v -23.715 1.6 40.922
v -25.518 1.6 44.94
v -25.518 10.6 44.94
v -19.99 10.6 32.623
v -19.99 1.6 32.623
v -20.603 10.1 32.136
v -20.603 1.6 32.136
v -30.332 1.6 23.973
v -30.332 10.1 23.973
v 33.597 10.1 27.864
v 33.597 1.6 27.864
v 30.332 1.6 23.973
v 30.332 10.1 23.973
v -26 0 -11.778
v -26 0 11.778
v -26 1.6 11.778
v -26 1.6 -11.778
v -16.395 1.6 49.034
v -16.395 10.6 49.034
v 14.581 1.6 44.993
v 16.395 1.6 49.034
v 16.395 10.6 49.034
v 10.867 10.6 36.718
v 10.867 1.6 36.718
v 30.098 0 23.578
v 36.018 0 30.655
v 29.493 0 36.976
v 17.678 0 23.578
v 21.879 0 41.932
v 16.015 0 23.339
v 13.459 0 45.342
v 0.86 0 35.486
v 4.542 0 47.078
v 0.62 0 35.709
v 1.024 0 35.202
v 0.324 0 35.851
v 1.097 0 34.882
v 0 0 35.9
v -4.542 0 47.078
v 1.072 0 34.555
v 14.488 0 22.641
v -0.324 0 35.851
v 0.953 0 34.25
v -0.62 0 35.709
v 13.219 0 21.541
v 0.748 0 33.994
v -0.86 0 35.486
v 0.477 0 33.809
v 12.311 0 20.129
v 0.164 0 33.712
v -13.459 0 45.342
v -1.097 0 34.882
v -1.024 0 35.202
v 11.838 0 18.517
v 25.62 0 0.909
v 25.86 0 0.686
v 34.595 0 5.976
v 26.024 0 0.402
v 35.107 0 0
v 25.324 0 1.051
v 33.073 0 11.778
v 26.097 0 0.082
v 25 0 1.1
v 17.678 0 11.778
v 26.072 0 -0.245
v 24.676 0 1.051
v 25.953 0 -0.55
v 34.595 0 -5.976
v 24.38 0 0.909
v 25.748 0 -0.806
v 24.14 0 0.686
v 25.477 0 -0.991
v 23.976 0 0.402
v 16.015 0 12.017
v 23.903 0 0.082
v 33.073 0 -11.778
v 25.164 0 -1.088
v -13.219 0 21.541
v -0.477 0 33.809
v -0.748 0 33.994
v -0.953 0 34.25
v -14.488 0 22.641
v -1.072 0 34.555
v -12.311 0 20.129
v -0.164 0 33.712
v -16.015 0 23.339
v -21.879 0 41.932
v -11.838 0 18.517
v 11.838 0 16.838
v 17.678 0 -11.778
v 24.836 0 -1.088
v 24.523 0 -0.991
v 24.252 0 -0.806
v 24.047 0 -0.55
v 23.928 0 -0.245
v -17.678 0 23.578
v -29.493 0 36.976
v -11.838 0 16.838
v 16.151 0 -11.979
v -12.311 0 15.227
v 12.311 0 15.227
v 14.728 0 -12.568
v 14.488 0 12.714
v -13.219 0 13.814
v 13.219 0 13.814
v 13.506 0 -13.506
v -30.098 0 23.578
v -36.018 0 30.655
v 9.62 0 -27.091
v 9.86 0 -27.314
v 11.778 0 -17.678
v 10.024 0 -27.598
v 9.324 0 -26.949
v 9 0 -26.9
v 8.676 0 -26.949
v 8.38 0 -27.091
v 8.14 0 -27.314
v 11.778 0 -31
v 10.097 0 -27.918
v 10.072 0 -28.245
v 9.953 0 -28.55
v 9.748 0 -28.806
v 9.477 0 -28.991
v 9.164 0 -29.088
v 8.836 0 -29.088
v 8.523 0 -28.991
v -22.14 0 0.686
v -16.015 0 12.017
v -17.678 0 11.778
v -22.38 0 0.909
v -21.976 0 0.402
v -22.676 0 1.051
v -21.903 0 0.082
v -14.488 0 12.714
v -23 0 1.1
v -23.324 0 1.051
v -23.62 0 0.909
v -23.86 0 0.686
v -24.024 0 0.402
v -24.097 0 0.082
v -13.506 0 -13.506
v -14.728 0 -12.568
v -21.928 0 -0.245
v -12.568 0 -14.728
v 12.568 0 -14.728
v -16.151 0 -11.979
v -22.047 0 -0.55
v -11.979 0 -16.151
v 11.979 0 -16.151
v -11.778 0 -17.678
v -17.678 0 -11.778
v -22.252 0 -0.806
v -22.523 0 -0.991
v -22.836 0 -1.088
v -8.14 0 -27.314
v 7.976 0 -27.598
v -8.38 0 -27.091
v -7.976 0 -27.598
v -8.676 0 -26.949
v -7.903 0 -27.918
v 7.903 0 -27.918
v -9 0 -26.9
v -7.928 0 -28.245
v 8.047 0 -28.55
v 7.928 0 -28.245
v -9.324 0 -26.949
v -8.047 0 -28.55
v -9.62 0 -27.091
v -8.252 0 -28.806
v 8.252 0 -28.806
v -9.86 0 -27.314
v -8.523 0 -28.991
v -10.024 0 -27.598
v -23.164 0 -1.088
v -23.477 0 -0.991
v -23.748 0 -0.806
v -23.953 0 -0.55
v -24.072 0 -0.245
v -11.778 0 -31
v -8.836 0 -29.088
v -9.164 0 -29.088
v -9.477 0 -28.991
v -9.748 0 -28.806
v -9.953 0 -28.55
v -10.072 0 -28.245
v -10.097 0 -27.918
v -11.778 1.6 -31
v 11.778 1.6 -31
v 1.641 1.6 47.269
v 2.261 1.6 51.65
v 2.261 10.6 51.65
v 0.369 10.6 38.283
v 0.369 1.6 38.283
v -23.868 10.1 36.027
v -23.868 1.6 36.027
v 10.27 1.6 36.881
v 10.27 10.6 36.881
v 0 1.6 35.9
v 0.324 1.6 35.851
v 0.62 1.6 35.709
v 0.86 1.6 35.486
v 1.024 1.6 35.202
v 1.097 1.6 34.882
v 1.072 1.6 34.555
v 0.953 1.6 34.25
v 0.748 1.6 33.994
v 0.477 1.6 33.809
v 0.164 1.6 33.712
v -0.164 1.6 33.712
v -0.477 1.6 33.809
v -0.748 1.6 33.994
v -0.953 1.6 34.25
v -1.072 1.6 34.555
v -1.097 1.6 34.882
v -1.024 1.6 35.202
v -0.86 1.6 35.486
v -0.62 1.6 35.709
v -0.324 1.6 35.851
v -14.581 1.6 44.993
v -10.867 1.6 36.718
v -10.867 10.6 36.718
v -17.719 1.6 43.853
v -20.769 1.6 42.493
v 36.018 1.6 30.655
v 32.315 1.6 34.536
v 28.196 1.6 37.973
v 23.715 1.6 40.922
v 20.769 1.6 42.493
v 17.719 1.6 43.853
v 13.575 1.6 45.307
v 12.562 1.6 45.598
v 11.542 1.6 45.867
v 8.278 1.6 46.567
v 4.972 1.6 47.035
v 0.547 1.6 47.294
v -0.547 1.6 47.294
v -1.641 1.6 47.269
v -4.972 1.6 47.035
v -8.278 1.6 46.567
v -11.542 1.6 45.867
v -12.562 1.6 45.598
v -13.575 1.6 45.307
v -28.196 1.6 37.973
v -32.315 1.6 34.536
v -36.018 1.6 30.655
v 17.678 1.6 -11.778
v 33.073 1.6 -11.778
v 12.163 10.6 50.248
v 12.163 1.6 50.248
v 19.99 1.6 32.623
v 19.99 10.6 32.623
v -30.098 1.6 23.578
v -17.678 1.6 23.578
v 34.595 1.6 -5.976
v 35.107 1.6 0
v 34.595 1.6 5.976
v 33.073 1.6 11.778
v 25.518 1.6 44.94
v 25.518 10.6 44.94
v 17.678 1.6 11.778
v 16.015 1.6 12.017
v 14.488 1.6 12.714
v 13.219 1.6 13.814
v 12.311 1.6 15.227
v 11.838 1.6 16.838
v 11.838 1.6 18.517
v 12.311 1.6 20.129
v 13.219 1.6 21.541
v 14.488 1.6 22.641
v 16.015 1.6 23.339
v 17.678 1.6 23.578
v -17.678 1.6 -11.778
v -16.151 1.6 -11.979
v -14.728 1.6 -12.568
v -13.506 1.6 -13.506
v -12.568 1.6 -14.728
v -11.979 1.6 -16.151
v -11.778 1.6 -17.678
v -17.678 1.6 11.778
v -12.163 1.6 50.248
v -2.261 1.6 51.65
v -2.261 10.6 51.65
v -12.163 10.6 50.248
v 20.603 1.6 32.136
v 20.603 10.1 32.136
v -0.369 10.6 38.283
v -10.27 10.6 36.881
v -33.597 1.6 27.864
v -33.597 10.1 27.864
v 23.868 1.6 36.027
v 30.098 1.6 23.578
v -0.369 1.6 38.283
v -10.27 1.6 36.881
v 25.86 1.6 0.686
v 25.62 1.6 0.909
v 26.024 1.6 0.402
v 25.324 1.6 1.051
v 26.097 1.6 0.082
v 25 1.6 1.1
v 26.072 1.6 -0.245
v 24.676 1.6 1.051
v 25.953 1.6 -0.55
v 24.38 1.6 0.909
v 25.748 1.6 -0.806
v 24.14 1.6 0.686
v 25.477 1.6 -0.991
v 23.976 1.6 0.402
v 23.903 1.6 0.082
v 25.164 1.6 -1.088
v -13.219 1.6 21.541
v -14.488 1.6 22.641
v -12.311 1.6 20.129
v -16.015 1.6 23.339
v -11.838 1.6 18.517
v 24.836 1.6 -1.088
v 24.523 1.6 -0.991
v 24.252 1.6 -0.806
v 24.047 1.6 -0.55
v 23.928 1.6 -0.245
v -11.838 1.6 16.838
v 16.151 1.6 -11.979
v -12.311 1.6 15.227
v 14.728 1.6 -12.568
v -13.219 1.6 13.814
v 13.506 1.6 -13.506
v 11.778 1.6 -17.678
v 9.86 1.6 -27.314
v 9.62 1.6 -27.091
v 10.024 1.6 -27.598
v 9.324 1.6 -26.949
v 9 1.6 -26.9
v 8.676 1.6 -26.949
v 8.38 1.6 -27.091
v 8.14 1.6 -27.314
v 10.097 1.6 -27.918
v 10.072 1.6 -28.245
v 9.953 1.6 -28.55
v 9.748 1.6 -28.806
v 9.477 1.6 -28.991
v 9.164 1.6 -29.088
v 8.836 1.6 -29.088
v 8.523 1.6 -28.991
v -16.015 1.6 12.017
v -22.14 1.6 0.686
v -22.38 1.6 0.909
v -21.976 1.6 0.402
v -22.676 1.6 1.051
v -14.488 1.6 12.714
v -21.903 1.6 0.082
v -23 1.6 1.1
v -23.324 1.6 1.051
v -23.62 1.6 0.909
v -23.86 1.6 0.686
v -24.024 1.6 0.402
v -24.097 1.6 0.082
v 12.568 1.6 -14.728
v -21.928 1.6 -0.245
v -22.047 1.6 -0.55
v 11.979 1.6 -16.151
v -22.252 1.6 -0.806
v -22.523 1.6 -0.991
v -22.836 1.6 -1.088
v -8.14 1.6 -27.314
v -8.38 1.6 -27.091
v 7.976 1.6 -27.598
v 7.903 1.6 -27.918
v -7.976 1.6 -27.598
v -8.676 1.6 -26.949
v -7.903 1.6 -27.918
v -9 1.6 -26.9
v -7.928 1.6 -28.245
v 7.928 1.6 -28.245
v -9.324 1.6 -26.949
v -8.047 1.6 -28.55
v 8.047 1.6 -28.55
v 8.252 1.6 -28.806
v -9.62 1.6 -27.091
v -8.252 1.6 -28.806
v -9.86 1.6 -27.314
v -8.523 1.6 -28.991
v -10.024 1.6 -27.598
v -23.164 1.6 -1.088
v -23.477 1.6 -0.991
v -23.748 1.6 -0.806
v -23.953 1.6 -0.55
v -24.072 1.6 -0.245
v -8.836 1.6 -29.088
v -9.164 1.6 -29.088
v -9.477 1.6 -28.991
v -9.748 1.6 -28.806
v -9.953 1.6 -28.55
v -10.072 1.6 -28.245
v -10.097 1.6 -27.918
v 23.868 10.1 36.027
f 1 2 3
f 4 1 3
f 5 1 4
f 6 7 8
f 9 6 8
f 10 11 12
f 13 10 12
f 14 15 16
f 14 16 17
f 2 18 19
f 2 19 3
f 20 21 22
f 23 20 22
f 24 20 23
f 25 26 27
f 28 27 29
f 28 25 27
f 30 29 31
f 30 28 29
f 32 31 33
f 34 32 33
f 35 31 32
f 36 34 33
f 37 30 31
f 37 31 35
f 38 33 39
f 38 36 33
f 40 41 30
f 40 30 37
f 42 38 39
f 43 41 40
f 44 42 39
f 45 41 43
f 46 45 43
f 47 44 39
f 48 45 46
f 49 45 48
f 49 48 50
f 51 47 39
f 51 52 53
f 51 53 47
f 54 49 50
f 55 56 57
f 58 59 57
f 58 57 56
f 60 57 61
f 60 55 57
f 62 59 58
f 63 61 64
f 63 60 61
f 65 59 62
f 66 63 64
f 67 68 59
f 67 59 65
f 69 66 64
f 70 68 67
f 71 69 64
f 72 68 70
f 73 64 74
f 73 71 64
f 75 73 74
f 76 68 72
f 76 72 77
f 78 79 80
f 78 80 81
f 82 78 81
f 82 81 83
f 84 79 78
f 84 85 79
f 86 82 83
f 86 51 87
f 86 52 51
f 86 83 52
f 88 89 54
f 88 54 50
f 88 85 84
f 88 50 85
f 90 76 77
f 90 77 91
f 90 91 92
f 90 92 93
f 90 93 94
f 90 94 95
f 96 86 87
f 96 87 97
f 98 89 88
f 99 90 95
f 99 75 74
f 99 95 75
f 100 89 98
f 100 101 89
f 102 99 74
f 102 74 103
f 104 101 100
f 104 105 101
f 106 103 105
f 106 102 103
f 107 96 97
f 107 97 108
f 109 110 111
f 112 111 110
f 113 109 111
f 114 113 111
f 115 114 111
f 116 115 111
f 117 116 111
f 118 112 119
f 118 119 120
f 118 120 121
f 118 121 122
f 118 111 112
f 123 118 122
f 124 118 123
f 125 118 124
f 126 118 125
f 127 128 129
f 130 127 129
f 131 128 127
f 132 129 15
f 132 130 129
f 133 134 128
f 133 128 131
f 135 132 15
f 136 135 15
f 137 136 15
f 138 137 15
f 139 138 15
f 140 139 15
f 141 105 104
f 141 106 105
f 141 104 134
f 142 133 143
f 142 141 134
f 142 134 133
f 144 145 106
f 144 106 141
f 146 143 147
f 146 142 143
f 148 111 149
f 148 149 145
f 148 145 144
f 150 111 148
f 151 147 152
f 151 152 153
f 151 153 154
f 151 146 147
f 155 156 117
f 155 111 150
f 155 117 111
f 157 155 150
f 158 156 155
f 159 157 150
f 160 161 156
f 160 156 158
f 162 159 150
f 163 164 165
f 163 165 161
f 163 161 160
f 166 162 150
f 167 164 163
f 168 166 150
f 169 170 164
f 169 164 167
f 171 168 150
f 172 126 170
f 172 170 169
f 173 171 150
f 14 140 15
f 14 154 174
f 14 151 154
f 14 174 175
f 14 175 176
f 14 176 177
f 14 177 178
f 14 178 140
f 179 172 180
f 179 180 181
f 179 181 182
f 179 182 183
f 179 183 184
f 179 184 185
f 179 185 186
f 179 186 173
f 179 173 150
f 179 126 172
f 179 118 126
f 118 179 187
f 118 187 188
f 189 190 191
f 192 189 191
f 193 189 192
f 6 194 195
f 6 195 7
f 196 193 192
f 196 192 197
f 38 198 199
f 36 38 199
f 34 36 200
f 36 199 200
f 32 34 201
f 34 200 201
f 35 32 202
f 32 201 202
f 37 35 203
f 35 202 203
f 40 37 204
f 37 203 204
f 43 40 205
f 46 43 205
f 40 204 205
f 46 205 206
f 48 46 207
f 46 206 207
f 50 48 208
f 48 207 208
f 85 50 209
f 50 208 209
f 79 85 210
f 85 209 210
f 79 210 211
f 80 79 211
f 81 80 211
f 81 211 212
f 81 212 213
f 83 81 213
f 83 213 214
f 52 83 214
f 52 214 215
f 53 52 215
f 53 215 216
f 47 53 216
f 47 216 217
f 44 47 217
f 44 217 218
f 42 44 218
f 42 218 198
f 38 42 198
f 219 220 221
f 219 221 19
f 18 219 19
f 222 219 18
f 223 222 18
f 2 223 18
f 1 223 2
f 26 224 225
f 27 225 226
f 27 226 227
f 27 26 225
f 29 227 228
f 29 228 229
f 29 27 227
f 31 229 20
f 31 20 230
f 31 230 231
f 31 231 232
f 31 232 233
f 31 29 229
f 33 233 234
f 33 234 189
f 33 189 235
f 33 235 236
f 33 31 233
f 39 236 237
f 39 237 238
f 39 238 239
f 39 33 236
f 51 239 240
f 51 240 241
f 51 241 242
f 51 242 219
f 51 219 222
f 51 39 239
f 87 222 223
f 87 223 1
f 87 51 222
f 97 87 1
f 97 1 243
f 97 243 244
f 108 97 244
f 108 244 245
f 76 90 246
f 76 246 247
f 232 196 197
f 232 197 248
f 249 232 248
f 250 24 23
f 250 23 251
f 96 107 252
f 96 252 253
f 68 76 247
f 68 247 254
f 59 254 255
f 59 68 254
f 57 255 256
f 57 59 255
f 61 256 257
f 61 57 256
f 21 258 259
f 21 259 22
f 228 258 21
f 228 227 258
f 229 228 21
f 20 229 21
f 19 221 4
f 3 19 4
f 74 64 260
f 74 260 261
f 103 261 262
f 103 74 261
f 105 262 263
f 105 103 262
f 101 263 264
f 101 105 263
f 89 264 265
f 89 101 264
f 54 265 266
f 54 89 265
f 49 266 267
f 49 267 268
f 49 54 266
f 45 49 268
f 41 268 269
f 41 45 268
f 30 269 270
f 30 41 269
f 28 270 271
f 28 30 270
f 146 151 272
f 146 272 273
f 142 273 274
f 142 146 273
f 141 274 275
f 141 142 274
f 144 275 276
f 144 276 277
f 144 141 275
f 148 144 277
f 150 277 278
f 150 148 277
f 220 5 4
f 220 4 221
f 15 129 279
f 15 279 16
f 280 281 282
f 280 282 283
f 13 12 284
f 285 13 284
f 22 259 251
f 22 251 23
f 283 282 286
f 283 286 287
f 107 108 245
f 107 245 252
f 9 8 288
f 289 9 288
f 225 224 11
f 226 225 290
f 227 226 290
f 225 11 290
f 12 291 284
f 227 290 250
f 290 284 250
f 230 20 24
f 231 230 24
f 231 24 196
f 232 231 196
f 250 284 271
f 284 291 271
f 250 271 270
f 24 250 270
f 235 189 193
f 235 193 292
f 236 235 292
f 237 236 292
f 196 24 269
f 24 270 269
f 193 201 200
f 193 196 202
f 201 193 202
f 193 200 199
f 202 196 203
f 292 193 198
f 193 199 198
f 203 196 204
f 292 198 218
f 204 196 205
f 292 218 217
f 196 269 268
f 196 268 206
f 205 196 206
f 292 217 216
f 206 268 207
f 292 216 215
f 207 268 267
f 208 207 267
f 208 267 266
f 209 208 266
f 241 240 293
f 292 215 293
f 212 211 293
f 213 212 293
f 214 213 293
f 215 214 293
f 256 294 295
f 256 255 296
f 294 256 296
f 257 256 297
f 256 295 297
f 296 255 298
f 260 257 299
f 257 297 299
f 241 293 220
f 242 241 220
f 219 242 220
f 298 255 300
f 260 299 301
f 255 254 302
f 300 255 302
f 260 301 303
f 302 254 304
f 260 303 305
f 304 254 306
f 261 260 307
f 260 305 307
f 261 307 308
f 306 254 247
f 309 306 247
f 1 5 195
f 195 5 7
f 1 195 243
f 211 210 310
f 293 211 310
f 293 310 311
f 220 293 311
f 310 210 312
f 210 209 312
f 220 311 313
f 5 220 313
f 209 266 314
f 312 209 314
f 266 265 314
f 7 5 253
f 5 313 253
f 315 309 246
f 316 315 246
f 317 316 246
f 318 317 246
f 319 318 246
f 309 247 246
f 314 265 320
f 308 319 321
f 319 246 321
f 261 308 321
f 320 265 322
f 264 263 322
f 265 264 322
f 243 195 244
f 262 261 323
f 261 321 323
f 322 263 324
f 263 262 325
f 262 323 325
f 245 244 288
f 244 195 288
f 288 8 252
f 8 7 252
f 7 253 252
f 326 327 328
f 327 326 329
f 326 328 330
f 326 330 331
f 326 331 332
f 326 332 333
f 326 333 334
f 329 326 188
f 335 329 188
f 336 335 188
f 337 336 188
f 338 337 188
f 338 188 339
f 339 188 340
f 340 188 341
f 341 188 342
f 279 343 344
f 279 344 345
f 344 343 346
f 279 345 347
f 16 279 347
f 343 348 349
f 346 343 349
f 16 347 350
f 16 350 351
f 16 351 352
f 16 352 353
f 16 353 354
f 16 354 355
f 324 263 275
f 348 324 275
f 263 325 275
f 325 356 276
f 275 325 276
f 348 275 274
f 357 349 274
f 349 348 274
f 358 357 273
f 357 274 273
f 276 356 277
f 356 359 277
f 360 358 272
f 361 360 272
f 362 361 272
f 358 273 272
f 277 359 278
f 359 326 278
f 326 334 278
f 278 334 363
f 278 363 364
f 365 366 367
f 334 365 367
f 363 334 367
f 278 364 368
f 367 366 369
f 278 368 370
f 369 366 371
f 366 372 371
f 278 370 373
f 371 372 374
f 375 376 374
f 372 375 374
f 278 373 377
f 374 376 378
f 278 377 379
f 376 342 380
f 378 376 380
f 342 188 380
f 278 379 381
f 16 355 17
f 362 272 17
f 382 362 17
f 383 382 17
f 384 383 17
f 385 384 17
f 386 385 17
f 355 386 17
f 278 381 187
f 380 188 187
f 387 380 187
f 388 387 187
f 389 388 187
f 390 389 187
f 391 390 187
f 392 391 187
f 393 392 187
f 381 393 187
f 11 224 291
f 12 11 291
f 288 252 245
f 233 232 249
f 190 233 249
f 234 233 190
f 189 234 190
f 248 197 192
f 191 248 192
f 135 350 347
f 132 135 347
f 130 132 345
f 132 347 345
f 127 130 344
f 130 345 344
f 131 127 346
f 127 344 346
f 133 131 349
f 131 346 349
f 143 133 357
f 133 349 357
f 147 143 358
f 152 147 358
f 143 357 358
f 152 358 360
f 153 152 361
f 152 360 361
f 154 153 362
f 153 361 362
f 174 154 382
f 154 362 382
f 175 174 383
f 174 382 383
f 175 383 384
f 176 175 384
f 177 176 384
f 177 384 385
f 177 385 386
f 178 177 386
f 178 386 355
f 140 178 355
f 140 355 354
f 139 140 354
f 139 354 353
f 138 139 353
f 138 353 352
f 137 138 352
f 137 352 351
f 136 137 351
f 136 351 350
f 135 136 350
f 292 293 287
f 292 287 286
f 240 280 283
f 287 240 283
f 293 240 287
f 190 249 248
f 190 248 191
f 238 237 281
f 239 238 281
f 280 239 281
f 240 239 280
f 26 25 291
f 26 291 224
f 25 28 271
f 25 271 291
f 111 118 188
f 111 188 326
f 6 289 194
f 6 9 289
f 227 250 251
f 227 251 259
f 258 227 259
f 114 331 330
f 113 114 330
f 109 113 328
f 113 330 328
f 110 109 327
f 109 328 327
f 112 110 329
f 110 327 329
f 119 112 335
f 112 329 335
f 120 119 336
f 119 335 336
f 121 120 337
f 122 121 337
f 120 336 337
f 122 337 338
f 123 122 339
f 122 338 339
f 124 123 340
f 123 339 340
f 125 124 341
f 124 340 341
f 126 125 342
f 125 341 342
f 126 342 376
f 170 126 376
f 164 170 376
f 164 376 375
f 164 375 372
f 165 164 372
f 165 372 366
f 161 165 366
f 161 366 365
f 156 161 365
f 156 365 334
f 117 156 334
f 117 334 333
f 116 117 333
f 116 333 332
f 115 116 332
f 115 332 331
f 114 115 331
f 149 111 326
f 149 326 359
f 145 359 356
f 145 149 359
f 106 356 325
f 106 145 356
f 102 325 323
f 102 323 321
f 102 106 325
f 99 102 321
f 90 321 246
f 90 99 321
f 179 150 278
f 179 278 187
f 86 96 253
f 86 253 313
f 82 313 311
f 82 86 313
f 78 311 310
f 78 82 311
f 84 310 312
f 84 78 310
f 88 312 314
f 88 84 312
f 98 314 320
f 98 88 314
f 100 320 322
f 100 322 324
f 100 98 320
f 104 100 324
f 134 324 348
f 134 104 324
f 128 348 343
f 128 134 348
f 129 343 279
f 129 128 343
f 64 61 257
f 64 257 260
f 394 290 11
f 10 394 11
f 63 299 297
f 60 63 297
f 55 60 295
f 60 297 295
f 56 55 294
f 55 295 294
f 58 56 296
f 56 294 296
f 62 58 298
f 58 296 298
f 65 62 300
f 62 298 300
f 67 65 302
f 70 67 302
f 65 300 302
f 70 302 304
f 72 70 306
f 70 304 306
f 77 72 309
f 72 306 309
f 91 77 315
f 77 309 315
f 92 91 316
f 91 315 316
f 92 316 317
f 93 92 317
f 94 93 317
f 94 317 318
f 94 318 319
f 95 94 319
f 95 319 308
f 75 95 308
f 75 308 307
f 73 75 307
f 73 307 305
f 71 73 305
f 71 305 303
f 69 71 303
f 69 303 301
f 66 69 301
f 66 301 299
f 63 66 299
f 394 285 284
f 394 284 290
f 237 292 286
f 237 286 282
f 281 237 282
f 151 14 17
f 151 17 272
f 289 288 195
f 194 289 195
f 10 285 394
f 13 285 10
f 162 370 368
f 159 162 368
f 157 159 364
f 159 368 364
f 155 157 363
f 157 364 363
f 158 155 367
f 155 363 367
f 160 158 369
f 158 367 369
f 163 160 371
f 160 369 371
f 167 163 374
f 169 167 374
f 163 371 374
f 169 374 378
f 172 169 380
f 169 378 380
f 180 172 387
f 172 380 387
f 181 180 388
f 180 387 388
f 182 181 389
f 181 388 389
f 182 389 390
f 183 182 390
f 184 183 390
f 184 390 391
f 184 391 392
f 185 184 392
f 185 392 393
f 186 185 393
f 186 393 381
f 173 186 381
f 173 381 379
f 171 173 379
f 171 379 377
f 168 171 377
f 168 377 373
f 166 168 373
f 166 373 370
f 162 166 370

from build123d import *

# Parameters (mm, degrees)
BOSS_EXTRUDE1_DEPTH = 1.6
BOSS_EXTRUDE2_DEPTH = 8.5
BOSS_EXTRUDE3_DEPTH = 9
SKETCH4_R           = 1.1
CUT_EXTRUDE1_DEPTH  = 64.607734681


with BuildPart() as part:
    # Sketch1 → Boss-Extrude1 (new body)
    with BuildSketch(Plane(origin=(0, 0, 0), x_dir=(1, 0, 0), z_dir=(0, 1, 0))):
        with BuildLine():
            Line((-11.77766953, 17.67766953), (-11.77766953, 31))
            Line((-11.77766953, 31), (11.77766953, 31))
            Line((11.77766953, 31), (11.77766953, 17.67766953))
            ThreePointArc((11.77766953, 17.67766953), (13.505739521, 13.505739521), (17.67766953, 11.77766953))
            Line((17.67766953, 11.77766953), (33.07278358, 11.77766953))
            ThreePointArc((33.07278358, 11.77766953), (35.1073, 0), (33.07278358, -11.77766953))
            Line((33.07278358, -11.77766953), (17.67766953, -11.77766953))
            ThreePointArc((17.67766953, -11.77766953), (11.77766953, -17.67766953), (17.67766953, -23.57766953))
            Line((17.67766953, -23.57766953), (30.09766953, -23.57766953))
            Line((30.09766953, -23.57766953), (36.017643771, -30.655106364))
            ThreePointArc((36.017643771, -30.655106364), (0, -47.297), (-36.017643771, -30.655106364))
            Line((-36.017643771, -30.655106364), (-30.09766953, -23.57766953))
            Line((-30.09766953, -23.57766953), (-17.67766953, -23.57766953))
            ThreePointArc((-17.67766953, -23.57766953), (-11.77766953, -17.67766953), (-17.67766953, -11.77766953))
            Line((-17.67766953, -11.77766953), (-26, -11.77766953))
            Line((-26, -11.77766953), (-26, 11.77766953))
            Line((-26, 11.77766953), (-17.67766953, 11.77766953))
            ThreePointArc((-17.67766953, 11.77766953), (-13.505739521, 13.505739521), (-11.77766953, 17.67766953))
        make_face()
    extrude(amount=BOSS_EXTRUDE1_DEPTH)

    # Sketch2 → Boss-Extrude2 (add)
    with BuildSketch(Plane(origin=(0, 1.6, 0), x_dir=(1, 0, 0), z_dir=(0, 1, 0))):
        Polygon((-33.597062742, -27.864051564), (-23.868298315, -36.027454207), (-20.602937258, -32.135948436), (-30.331701685, -23.972545793), align=None)
        Polygon((23.868298315, -36.027454207), (33.597062742, -27.864051564), (30.331701685, -23.972545793), (20.602937258, -32.135948436), align=None)
    extrude(amount=BOSS_EXTRUDE2_DEPTH)

    # Sketch3 → Boss-Extrude3 (add)
    with BuildSketch(Plane(origin=(0, 1.6, 0), x_dir=(1, 0, 0), z_dir=(0, 1, 0))):
        Polygon((-25.517948101, -44.939697826), (-19.990220336, -32.623276846), (-10.866945536, -36.717890005), (-16.394673301, -49.034310985), align=None)
        Polygon((-0.36916096, -38.28278004), (-2.261296496, -51.649523215), (-12.162587737, -50.247941336), (-10.2704522, -36.881198161), align=None)
        Polygon((2.261296496, -51.649523215), (0.36916096, -38.28278004), (10.2704522, -36.881198161), (12.162587737, -50.247941336), align=None)
        Polygon((16.394673301, -49.034310985), (10.866945536, -36.717890005), (19.990220336, -32.623276846), (25.517948101, -44.939697826), align=None)
    extrude(amount=BOSS_EXTRUDE3_DEPTH)

    # Sketch4 → Cut-Extrude1 (cut, through all)
    with BuildSketch(Plane(origin=(0, 1.6, 0), x_dir=(1, 0, 0), z_dir=(0, 1, 0))):
        with Locations(Location((0, -34.8, 0), (0, 0, 270))):
            Circle(SKETCH4_R)
        with Locations(Location((25, 0, 0), (0, 0, 270))):
            Circle(SKETCH4_R)
        with Locations(Location((-23, 0, 0), (0, 0, 270))):
            Circle(SKETCH4_R)
        with Locations(Location((-9, 28, 0), (0, 0, 270))):
            Circle(SKETCH4_R)
        with Locations(Location((9, 28, 0), (0, 0, 270))):
            Circle(SKETCH4_R)
    extrude(amount=-CUT_EXTRUDE1_DEPTH, mode=Mode.SUBTRACT)


solid = part.part
